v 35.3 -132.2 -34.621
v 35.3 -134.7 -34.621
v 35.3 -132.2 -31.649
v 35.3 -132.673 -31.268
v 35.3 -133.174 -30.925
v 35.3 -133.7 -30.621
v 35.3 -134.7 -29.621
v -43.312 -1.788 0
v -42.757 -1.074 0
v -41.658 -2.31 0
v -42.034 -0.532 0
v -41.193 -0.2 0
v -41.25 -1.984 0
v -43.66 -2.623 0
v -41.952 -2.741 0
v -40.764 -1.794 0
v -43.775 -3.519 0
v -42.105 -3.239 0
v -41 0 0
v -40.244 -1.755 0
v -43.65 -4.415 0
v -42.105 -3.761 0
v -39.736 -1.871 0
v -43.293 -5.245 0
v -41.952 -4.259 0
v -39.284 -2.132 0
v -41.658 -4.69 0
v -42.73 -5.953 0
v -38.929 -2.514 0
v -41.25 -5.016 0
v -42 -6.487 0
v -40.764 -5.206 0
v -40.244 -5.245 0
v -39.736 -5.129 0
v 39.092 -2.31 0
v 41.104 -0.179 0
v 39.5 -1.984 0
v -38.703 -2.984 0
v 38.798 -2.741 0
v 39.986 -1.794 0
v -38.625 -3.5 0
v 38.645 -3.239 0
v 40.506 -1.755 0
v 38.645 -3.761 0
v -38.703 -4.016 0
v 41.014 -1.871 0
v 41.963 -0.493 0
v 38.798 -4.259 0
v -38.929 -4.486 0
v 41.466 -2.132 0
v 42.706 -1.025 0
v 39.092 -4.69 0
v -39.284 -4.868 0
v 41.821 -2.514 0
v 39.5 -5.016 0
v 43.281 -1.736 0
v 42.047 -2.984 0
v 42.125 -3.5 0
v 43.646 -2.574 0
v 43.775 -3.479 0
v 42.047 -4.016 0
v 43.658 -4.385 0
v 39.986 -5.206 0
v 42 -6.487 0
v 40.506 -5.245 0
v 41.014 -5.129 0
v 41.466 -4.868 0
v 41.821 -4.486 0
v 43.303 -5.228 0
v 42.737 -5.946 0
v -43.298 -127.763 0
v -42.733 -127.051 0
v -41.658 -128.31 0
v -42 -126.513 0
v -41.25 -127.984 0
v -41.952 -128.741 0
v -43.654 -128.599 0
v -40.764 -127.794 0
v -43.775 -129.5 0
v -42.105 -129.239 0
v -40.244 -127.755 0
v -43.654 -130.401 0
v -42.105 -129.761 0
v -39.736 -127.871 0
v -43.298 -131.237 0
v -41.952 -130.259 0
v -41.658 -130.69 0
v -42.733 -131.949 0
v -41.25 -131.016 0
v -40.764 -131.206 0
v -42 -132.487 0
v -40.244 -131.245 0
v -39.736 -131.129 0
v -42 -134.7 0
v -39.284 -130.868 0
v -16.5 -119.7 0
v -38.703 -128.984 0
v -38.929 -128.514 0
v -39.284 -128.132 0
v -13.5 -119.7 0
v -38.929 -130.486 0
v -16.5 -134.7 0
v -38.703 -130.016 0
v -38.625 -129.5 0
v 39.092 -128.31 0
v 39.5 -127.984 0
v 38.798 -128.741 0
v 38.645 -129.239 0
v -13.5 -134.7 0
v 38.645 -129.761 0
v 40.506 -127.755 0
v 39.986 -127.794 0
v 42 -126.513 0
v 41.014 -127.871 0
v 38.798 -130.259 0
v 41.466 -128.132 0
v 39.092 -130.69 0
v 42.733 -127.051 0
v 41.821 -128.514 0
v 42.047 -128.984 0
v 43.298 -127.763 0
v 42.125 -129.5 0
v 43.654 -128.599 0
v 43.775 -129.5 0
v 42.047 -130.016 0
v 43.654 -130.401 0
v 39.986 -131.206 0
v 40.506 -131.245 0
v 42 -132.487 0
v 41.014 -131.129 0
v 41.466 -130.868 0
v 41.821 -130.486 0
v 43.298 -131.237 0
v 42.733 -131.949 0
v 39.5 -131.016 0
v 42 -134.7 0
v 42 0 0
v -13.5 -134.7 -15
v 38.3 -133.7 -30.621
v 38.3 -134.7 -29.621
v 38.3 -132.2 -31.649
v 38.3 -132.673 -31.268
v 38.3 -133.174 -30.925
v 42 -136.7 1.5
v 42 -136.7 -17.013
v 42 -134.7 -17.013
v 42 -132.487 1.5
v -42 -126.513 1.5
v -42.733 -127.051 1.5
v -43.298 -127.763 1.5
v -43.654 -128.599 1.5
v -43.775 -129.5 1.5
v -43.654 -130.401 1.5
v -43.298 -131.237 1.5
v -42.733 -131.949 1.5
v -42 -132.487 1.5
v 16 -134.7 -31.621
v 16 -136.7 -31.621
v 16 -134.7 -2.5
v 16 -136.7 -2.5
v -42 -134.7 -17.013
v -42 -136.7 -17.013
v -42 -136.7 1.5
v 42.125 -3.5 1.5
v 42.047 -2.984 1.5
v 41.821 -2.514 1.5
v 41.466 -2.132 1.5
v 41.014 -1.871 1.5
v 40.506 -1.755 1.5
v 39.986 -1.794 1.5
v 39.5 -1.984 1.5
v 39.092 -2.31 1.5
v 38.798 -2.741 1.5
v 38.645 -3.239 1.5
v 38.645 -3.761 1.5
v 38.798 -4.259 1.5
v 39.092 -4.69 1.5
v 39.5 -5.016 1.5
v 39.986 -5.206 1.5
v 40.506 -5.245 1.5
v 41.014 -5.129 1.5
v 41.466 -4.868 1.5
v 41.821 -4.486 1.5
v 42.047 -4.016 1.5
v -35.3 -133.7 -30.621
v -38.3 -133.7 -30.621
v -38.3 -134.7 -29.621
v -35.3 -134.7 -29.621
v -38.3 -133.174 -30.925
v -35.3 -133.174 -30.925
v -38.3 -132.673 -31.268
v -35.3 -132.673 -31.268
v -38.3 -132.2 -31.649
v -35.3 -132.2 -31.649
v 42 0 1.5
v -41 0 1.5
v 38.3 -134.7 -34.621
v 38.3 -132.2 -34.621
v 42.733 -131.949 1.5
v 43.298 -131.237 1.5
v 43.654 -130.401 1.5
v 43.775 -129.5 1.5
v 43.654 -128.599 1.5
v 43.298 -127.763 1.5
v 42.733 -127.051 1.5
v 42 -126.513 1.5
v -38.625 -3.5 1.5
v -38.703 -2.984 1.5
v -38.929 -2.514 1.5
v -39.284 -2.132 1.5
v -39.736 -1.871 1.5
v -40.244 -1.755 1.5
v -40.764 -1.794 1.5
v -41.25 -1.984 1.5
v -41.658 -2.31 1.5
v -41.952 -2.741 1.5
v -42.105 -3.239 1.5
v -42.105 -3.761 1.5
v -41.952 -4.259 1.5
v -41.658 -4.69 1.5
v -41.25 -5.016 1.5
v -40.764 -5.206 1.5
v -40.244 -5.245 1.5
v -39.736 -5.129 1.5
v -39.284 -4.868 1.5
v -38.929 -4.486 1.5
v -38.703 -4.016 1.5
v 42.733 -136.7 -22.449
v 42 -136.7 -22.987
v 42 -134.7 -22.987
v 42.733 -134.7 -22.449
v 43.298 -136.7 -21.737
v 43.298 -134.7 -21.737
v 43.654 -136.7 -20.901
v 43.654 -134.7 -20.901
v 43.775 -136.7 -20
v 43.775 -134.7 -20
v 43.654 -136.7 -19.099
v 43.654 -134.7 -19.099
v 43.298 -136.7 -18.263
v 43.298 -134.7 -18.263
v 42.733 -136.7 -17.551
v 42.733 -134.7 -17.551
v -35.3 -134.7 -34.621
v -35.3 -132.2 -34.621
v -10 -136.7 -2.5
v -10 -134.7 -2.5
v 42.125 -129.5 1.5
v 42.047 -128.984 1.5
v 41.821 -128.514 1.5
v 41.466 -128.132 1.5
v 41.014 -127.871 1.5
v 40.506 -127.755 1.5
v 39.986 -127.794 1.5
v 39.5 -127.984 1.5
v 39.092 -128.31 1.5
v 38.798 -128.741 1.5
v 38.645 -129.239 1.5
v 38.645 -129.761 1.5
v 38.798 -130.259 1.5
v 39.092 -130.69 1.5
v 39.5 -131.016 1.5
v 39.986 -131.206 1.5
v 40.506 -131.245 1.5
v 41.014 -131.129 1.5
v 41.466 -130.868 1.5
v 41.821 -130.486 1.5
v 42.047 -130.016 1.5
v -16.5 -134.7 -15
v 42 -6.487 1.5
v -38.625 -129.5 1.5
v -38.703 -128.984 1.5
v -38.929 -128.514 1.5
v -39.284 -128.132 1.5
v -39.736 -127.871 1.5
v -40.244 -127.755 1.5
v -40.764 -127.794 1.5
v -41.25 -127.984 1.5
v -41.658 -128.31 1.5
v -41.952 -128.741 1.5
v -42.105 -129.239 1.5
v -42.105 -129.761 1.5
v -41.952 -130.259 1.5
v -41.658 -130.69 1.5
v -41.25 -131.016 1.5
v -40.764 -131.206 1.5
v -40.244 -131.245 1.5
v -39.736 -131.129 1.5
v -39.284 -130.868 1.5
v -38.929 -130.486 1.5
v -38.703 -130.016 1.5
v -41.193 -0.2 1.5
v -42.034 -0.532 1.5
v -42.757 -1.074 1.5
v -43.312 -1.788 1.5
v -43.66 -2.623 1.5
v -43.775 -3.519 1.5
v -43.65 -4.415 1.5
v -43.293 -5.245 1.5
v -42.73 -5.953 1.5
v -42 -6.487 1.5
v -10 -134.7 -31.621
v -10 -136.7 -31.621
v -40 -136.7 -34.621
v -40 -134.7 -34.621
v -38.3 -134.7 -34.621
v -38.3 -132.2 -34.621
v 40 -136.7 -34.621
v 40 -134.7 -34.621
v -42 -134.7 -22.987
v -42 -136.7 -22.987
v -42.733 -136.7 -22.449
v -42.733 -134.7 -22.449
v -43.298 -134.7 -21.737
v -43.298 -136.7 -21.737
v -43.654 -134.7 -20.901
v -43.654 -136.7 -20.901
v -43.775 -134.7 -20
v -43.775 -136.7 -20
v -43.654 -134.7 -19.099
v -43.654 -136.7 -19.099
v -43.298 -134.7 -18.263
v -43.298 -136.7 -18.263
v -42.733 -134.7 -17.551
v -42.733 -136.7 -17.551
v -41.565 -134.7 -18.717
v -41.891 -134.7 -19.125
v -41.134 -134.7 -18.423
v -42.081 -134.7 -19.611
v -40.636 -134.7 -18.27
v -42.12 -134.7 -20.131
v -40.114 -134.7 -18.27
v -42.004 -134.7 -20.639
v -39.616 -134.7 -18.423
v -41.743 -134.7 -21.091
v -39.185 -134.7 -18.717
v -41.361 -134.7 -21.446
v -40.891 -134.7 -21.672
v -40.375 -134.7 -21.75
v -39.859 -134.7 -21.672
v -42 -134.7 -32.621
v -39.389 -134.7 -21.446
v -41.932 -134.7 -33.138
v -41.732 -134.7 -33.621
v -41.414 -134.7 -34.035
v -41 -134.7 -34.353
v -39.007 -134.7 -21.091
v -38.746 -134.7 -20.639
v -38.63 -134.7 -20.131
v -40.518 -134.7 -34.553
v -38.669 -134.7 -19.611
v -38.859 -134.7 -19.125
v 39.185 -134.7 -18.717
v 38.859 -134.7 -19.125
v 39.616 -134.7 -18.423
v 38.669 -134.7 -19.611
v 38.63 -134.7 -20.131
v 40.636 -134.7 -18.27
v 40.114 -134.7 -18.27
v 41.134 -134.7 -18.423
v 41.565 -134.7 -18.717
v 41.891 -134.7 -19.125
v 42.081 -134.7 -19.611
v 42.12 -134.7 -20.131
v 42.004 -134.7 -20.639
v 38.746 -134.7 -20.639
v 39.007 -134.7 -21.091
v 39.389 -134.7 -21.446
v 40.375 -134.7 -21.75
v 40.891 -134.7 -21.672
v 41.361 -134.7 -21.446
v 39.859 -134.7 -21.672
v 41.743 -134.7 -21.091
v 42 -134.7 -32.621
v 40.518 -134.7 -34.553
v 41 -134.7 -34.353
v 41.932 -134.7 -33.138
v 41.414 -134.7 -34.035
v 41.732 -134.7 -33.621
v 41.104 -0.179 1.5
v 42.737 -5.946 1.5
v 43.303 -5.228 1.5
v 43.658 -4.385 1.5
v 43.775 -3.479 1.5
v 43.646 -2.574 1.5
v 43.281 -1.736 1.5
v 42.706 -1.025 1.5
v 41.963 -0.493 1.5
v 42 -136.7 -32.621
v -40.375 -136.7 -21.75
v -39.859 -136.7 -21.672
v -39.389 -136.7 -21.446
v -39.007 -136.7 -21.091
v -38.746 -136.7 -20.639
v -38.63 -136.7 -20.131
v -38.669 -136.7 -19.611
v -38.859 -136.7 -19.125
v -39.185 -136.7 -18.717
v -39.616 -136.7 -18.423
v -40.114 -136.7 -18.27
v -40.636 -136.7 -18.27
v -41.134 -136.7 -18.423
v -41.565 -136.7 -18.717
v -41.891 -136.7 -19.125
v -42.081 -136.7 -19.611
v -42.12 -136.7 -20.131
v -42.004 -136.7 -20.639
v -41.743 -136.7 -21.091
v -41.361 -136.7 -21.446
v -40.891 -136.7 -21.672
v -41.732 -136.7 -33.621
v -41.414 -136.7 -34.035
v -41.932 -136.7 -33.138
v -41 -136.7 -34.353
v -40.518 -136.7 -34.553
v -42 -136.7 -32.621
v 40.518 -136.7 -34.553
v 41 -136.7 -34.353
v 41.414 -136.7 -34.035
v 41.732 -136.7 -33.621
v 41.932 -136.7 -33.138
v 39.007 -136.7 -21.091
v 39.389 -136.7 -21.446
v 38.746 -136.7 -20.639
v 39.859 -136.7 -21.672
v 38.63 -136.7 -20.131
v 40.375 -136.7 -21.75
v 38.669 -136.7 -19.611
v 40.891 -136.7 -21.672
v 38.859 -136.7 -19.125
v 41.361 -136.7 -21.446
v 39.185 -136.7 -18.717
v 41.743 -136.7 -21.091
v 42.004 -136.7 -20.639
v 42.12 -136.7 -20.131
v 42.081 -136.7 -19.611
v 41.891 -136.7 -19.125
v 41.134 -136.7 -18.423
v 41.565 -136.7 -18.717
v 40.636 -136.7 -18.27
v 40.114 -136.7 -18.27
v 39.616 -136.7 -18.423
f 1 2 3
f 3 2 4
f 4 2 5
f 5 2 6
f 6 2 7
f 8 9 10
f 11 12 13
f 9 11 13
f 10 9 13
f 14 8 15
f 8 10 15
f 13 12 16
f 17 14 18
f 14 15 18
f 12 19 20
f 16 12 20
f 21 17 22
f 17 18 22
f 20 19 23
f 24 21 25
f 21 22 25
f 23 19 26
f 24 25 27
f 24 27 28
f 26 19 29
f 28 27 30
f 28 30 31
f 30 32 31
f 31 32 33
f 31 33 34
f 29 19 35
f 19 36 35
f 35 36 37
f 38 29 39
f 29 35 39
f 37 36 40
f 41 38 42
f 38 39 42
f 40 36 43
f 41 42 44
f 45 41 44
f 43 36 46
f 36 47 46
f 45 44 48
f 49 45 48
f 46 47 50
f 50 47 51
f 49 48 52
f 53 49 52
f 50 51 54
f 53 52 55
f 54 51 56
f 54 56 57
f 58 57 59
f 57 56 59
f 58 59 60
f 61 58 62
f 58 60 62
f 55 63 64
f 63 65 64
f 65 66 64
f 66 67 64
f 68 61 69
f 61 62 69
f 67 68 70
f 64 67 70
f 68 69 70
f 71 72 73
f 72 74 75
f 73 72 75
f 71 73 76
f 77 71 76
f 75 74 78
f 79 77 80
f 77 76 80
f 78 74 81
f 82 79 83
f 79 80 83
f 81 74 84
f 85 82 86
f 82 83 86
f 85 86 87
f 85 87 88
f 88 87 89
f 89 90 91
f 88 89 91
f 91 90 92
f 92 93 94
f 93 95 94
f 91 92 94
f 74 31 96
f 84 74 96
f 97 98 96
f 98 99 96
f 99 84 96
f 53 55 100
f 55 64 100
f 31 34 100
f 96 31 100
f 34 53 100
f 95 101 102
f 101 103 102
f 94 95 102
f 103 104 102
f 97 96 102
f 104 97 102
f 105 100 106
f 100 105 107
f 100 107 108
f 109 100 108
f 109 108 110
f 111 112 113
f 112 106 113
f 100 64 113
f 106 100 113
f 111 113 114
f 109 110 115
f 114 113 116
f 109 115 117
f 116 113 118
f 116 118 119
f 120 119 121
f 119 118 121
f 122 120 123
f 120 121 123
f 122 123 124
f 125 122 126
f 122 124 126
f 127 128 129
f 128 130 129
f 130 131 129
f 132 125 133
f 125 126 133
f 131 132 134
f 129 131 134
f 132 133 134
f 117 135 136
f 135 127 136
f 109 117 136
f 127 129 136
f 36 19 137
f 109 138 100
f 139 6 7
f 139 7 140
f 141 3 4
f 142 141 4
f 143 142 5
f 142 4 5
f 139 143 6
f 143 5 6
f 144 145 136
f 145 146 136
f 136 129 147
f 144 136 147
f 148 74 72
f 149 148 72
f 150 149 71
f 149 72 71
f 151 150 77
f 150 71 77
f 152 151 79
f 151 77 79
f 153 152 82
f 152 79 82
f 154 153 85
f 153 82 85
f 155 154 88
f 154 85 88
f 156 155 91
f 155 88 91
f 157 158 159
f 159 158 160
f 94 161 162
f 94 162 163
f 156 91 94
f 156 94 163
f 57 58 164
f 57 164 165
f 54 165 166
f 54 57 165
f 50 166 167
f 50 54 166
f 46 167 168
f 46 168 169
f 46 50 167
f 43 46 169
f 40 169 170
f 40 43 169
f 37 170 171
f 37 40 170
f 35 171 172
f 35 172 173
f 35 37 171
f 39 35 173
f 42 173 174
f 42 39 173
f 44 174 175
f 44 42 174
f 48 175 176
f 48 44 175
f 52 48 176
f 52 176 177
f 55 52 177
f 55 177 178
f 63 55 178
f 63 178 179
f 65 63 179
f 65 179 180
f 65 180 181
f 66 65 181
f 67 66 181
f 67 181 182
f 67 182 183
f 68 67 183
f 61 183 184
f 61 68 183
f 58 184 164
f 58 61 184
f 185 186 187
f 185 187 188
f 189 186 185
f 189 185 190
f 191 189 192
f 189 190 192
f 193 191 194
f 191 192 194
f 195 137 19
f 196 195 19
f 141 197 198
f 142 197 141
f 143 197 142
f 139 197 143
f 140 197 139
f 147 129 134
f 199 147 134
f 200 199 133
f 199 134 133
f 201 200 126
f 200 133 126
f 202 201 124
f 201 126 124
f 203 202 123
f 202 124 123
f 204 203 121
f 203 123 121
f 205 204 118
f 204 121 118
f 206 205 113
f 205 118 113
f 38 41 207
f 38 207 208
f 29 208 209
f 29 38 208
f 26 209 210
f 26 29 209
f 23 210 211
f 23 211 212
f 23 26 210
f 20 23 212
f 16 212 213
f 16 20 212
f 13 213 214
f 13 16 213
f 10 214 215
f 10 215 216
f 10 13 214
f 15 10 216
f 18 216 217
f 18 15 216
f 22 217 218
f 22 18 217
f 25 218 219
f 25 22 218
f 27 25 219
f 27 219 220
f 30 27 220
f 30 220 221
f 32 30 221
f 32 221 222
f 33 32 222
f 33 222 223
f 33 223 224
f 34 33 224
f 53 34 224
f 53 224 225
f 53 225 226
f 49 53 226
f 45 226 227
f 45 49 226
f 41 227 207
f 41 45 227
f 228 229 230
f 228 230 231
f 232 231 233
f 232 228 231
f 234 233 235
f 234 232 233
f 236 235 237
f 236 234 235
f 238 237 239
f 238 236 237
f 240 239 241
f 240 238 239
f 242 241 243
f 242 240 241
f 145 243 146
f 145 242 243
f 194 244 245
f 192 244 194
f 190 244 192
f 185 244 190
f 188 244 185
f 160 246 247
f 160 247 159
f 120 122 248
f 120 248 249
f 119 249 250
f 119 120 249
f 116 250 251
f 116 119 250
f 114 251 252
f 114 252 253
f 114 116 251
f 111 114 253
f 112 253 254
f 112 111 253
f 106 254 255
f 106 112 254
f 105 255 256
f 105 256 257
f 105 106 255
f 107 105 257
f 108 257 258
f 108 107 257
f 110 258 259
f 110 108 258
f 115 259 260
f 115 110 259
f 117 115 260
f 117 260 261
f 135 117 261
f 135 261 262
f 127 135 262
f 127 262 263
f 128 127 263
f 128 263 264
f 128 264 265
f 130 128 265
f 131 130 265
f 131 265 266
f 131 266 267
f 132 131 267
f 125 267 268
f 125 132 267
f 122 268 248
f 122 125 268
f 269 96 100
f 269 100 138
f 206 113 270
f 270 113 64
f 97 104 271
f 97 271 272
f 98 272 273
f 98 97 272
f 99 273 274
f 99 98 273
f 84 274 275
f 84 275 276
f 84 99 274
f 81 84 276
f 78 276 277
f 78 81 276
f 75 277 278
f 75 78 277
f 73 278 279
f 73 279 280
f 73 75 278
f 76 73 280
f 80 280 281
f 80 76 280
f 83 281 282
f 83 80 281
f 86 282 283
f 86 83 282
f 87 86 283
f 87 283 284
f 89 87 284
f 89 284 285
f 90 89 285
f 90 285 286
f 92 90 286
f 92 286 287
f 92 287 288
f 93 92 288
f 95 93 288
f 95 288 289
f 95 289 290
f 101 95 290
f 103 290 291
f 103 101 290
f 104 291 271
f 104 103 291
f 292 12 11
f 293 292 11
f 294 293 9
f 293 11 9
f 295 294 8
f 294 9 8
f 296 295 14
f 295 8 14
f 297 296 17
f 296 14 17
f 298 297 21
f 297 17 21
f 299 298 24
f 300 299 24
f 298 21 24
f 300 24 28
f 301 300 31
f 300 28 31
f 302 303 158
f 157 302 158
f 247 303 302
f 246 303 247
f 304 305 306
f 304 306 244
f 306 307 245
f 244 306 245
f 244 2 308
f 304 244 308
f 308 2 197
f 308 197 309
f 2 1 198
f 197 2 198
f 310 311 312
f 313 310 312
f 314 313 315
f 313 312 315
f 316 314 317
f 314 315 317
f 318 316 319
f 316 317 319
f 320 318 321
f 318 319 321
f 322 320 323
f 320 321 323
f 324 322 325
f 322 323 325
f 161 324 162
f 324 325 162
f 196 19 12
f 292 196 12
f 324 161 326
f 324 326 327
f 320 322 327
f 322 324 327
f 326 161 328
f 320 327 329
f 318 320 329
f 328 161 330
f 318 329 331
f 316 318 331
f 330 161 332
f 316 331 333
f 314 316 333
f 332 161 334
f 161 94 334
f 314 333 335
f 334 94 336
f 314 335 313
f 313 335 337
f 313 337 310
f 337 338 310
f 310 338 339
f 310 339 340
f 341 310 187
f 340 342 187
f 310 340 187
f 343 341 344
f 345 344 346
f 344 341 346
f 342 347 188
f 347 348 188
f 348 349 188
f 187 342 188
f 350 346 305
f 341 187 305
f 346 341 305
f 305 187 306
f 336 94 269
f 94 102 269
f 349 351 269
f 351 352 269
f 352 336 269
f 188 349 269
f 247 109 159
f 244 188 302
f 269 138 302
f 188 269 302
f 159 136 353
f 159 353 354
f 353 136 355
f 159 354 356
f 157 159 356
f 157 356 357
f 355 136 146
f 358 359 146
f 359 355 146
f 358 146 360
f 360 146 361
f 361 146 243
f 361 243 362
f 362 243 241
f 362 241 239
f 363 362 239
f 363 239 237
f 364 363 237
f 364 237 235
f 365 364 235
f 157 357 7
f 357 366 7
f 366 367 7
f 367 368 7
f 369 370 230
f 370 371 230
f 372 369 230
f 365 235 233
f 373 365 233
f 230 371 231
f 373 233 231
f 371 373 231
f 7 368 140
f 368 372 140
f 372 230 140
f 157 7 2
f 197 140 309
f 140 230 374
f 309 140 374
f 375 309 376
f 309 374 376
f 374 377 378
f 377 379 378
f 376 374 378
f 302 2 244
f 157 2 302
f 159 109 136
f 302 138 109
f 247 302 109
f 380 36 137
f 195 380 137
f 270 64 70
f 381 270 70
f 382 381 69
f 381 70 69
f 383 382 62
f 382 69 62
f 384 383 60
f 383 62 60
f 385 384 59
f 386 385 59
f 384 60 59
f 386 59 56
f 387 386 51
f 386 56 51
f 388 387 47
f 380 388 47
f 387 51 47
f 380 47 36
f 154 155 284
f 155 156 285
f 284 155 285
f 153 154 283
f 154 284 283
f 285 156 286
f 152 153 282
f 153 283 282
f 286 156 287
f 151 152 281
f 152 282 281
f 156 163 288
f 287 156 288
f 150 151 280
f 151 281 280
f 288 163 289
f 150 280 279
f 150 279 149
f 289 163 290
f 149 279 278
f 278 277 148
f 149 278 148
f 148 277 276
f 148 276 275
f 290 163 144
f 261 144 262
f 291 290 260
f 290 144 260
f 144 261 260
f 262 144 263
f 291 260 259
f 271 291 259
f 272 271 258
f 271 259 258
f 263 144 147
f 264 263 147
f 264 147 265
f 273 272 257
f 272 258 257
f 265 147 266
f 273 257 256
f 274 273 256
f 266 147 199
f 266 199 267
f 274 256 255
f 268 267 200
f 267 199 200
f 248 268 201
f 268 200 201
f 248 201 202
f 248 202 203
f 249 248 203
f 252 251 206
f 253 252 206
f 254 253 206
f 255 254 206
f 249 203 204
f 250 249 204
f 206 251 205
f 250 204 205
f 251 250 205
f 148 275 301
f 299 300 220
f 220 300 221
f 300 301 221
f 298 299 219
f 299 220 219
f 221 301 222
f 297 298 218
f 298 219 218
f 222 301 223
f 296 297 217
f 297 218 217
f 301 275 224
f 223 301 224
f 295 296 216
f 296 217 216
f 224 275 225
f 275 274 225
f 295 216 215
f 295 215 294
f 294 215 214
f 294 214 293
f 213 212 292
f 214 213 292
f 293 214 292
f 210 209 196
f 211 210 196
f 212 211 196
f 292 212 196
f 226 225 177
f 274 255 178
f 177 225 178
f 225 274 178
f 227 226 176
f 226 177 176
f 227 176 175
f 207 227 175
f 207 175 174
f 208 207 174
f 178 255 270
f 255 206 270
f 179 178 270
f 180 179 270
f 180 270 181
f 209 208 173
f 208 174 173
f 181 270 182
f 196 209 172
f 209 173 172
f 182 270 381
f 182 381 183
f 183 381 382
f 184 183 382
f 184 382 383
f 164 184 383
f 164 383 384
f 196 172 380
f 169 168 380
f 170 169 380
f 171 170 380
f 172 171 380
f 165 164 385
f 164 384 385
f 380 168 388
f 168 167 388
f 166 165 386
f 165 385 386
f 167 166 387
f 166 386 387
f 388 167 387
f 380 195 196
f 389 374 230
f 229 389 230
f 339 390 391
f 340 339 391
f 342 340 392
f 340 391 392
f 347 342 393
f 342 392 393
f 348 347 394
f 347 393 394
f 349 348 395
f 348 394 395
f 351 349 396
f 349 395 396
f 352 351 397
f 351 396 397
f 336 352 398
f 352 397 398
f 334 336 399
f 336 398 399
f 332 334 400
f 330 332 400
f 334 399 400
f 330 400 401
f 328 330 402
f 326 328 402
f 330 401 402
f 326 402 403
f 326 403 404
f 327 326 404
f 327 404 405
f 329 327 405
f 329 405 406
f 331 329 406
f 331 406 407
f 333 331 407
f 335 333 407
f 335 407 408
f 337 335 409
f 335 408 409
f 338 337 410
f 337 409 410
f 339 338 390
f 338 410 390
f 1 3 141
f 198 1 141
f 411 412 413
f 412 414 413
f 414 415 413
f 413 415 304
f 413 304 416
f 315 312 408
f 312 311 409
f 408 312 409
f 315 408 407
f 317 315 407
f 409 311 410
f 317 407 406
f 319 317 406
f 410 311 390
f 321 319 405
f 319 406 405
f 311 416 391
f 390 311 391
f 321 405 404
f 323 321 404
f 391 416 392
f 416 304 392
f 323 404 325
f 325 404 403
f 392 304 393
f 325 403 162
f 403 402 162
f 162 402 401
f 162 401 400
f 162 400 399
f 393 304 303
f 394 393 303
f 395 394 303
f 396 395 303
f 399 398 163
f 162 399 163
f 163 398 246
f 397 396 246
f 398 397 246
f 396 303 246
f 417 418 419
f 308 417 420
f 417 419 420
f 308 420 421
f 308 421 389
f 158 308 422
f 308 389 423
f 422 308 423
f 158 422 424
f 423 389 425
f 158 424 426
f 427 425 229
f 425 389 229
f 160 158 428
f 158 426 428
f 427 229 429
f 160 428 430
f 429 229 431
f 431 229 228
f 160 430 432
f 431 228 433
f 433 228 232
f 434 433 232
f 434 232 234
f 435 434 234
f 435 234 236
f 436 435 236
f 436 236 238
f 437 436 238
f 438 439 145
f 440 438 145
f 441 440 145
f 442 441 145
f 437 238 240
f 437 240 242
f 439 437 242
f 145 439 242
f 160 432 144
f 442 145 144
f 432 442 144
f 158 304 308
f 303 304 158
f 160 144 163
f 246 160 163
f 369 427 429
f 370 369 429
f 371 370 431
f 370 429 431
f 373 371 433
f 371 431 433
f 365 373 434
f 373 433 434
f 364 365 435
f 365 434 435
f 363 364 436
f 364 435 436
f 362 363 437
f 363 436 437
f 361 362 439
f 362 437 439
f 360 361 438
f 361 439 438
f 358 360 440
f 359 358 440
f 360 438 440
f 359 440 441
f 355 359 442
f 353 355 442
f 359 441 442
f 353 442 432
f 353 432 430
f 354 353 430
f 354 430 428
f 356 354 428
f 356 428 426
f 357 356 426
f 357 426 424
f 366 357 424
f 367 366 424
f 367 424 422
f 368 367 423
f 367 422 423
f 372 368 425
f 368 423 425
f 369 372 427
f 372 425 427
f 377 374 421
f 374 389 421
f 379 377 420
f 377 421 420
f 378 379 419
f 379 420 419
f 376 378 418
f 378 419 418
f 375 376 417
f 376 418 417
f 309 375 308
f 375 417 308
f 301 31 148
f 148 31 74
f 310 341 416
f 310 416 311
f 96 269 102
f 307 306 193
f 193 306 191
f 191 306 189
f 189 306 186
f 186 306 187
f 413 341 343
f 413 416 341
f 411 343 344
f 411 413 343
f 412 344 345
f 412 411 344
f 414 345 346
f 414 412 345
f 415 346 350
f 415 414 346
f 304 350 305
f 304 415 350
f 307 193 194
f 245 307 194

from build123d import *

# Parameters (mm, degrees)
SKETCH1_R                = 1.75
BOSS_EXTRUDE1_DEPTH      = 1.5
BOSS_EXTRUDE2_START      = -84
BOSS_EXTRUDE2_DEPTH      = 84
BOSS_EXTRUDE3_DEPTH      = 1.5
BOSS_EXTRUDE3_DEPTH_BACK = 1.5
BOSS_EXTRUDE4_DEPTH      = 2
SKETCH5_R                = 1.75
CUT_EXTRUDE1_DEPTH       = 2
CUT_EXTRUDE2_DEPTH       = 150.007183132
CUT_EXTRUDE2_DEPTH_BACK  = 150.007183132
SKETCH6_W                = 84
SKETCH6_H                = 5.379304891
BOSS_EXTRUDE6_START      = -2
SKETCH7_W                = 3
SKETCH7_H                = 4
BOSS_EXTRUDE6_DEPTH      = 2.5
FILLET1_R                = 2
CHAMFER1_SIZE            = 1
FILLET2_R                = 8
SKETCH8_W                = 26
SKETCH8_H                = 29.120695109
CUT_EXTRUDE3_DEPTH       = 22.4262221


with BuildPart() as part:
    # Sketch1 → Boss-Extrude1 (new body)
    with BuildSketch(Plane.XY):
        with BuildLine():
            Line((-38.75, -134.5), (38.75, -134.5))
            Line((38.75, -134.5), (42, -134.5))
            Line((42, -134.5), (42, -132.48653227))
            ThreePointArc((42, -132.48653227), (43.775, -129.5), (42, -126.51346773))
            Line((42, -126.51346773), (42, -6.48653227))
            ThreePointArc((42, -6.48653227), (43.741212037, -3.021861398), (41.104087703, -0.179091823))
            Line((41.104087703, -0.179091823), (42, 0))
            Line((42, 0), (-41, 0))
            Line((-41, 0), (-41.193033114, -0.199875483))
            ThreePointArc((-41.193033114, -0.199875483), (-43.747330957, -3.067121364), (-42, -6.48653227))
            Line((-42, -6.48653227), (-42, -126.51346773))
            ThreePointArc((-42, -126.51346773), (-43.775, -129.5), (-42, -132.48653227))
            Line((-42, -132.48653227), (-42, -134.5))
            Line((-42, -134.5), (-38.75, -134.5))
        make_face()
        with Locations((-40.375, -129.5)):
            Circle(SKETCH1_R, mode=Mode.SUBTRACT)
        with Locations((40.375, -129.5)):
            Circle(SKETCH1_R, mode=Mode.SUBTRACT)
        with Locations((40.375, -3.5)):
            Circle(SKETCH1_R, mode=Mode.SUBTRACT)
        with Locations((-40.375, -3.5)):
            Circle(SKETCH1_R, mode=Mode.SUBTRACT)
    extrude(amount=BOSS_EXTRUDE1_DEPTH)

    # Sketch2 → Boss-Extrude2 (add)
    with BuildSketch(Plane.ZY.offset(42).offset(BOSS_EXTRUDE2_START)):
        Polygon((1.5, -136.7), (1.5, -134.5), (0, -134.5), (0, -134.7), (-40, -134.7), (-40, -136.7), align=None)
    extrude(amount=BOSS_EXTRUDE2_DEPTH)

    # Sketch3 → Boss-Extrude3 (add, two sides: drawn at the far end of the back side and taken through both)
    with BuildSketch(Plane(origin=(-15, 0, 0), x_dir=(0, 0, -1), z_dir=(1, 0, 0)).offset(-BOSS_EXTRUDE3_DEPTH_BACK)):
        Polygon((0, -119.7), (15, -134.7), (0, -134.7), align=None)
    extrude(amount=BOSS_EXTRUDE3_DEPTH + BOSS_EXTRUDE3_DEPTH_BACK)

    # Sketch4 → Boss-Extrude4 (add)
    with BuildSketch(Plane.XZ.offset(136.7)):
        with BuildLine():
            Line((-42, -17.01346773), (-42, -22.98653227))
            ThreePointArc((-42, -22.98653227), (-43.775, -20), (-42, -17.01346773))
        make_face()
        with BuildLine():
            Line((42, -17.01346773), (42, -22.98653227))
            ThreePointArc((42, -22.98653227), (43.775, -20), (42, -17.01346773))
        make_face()
    extrude(amount=-BOSS_EXTRUDE4_DEPTH)

    # Sketch5 → Cut-Extrude1 (cut)
    with BuildSketch(Plane.XZ.offset(136.7)):
        with Locations(Location((40.375, -20, 0), (0, 0, 270))):
            Circle(SKETCH5_R)
        with Locations(Location((-40.375, -20, 0), (0, 0, 270))):
            Circle(SKETCH5_R)
    extrude(amount=-CUT_EXTRUDE1_DEPTH, mode=Mode.SUBTRACT)

    # Sketch6 → Cut-Extrude2 (cut, two sides: drawn at the far end of the back side and taken through both)
    with BuildSketch(Plane.XZ.offset(136.7).offset(-CUT_EXTRUDE2_DEPTH_BACK)):
        with Locations((0, -37.310347554)):
            Rectangle(SKETCH6_W, SKETCH6_H)
    extrude(amount=CUT_EXTRUDE2_DEPTH + CUT_EXTRUDE2_DEPTH_BACK, mode=Mode.SUBTRACT)

    # Sketch7 → Boss-Extrude6 (add)
    with BuildSketch(Plane.XZ.offset(136.7).offset(BOSS_EXTRUDE6_START)):
        with Locations((-36.8, -32.620695109)):
            Rectangle(SKETCH7_W, SKETCH7_H)
        with Locations((36.8, -32.620695109)):
            Rectangle(SKETCH7_W, SKETCH7_H)
    extrude(amount=-BOSS_EXTRUDE6_DEPTH)

    # Fillet1
    fillet1_edges = [part.edges().sort_by_distance(p)[0] for p in [
        (42, -135.7, -34.620695109),
        (-42, -135.7, -34.620695109),
    ]]
    fillet(fillet1_edges, radius=FILLET1_R)

    # Chamfer1
    chamfer1_edges = [part.edges().sort_by_distance(p)[0] for p in [
        (-36.8, -134.7, -30.620695109),
        (-36.8, -132.2, -30.620695109),
        (36.8, -134.7, -30.620695109),
        (36.8, -132.2, -30.620695109),
    ]]
    chamfer(chamfer1_edges, length=CHAMFER1_SIZE)

    # Fillet2
    # the kernel refuses this fillet: 8 mm, written as the material it takes off along each edge
    with BuildSketch(Plane(origin=(-30.303909917, -133.2, -30.620695109), x_dir=(0, -1.0, -1.111999381457983e-11), z_dir=(-1, 0, 0))) as fillet2_piece_1:
        with BuildLine():
            CenterArc((4.243746579, -7.06996192), FILLET2_R, 117.902496562, 17.097503438)
            Line((-1.413107671, -1.413107671), (0, 0))
            Line((0, 0), (0.5, 0))
        make_face()
    extrude(amount=12.992180166, mode=Mode.SUBTRACT)
    with BuildSketch(Plane(origin=(30.303909917, -133.2, -30.620695109), x_dir=(0, 0.7071067811865485, -0.7071067811865467), z_dir=(1, 0, 0))) as fillet2_piece_2:
        with BuildLine():
            CenterArc((1.998436033, -8), FILLET2_R, 90, 17.097503438)
            Line((-0.353553391, -0.353553391), (0, 0))
            Line((0, 0), (1.998436033, 0))
        make_face()
    extrude(amount=12.992180166, mode=Mode.SUBTRACT)

    # Sketch8 → Cut-Extrude3 (cut)
    with BuildSketch(Plane.XZ.offset(136.7)):
        with Locations((3, -17.060347555)):
            Rectangle(SKETCH8_W, SKETCH8_H)
    extrude(amount=-CUT_EXTRUDE3_DEPTH, mode=Mode.SUBTRACT)


solid = part.part
